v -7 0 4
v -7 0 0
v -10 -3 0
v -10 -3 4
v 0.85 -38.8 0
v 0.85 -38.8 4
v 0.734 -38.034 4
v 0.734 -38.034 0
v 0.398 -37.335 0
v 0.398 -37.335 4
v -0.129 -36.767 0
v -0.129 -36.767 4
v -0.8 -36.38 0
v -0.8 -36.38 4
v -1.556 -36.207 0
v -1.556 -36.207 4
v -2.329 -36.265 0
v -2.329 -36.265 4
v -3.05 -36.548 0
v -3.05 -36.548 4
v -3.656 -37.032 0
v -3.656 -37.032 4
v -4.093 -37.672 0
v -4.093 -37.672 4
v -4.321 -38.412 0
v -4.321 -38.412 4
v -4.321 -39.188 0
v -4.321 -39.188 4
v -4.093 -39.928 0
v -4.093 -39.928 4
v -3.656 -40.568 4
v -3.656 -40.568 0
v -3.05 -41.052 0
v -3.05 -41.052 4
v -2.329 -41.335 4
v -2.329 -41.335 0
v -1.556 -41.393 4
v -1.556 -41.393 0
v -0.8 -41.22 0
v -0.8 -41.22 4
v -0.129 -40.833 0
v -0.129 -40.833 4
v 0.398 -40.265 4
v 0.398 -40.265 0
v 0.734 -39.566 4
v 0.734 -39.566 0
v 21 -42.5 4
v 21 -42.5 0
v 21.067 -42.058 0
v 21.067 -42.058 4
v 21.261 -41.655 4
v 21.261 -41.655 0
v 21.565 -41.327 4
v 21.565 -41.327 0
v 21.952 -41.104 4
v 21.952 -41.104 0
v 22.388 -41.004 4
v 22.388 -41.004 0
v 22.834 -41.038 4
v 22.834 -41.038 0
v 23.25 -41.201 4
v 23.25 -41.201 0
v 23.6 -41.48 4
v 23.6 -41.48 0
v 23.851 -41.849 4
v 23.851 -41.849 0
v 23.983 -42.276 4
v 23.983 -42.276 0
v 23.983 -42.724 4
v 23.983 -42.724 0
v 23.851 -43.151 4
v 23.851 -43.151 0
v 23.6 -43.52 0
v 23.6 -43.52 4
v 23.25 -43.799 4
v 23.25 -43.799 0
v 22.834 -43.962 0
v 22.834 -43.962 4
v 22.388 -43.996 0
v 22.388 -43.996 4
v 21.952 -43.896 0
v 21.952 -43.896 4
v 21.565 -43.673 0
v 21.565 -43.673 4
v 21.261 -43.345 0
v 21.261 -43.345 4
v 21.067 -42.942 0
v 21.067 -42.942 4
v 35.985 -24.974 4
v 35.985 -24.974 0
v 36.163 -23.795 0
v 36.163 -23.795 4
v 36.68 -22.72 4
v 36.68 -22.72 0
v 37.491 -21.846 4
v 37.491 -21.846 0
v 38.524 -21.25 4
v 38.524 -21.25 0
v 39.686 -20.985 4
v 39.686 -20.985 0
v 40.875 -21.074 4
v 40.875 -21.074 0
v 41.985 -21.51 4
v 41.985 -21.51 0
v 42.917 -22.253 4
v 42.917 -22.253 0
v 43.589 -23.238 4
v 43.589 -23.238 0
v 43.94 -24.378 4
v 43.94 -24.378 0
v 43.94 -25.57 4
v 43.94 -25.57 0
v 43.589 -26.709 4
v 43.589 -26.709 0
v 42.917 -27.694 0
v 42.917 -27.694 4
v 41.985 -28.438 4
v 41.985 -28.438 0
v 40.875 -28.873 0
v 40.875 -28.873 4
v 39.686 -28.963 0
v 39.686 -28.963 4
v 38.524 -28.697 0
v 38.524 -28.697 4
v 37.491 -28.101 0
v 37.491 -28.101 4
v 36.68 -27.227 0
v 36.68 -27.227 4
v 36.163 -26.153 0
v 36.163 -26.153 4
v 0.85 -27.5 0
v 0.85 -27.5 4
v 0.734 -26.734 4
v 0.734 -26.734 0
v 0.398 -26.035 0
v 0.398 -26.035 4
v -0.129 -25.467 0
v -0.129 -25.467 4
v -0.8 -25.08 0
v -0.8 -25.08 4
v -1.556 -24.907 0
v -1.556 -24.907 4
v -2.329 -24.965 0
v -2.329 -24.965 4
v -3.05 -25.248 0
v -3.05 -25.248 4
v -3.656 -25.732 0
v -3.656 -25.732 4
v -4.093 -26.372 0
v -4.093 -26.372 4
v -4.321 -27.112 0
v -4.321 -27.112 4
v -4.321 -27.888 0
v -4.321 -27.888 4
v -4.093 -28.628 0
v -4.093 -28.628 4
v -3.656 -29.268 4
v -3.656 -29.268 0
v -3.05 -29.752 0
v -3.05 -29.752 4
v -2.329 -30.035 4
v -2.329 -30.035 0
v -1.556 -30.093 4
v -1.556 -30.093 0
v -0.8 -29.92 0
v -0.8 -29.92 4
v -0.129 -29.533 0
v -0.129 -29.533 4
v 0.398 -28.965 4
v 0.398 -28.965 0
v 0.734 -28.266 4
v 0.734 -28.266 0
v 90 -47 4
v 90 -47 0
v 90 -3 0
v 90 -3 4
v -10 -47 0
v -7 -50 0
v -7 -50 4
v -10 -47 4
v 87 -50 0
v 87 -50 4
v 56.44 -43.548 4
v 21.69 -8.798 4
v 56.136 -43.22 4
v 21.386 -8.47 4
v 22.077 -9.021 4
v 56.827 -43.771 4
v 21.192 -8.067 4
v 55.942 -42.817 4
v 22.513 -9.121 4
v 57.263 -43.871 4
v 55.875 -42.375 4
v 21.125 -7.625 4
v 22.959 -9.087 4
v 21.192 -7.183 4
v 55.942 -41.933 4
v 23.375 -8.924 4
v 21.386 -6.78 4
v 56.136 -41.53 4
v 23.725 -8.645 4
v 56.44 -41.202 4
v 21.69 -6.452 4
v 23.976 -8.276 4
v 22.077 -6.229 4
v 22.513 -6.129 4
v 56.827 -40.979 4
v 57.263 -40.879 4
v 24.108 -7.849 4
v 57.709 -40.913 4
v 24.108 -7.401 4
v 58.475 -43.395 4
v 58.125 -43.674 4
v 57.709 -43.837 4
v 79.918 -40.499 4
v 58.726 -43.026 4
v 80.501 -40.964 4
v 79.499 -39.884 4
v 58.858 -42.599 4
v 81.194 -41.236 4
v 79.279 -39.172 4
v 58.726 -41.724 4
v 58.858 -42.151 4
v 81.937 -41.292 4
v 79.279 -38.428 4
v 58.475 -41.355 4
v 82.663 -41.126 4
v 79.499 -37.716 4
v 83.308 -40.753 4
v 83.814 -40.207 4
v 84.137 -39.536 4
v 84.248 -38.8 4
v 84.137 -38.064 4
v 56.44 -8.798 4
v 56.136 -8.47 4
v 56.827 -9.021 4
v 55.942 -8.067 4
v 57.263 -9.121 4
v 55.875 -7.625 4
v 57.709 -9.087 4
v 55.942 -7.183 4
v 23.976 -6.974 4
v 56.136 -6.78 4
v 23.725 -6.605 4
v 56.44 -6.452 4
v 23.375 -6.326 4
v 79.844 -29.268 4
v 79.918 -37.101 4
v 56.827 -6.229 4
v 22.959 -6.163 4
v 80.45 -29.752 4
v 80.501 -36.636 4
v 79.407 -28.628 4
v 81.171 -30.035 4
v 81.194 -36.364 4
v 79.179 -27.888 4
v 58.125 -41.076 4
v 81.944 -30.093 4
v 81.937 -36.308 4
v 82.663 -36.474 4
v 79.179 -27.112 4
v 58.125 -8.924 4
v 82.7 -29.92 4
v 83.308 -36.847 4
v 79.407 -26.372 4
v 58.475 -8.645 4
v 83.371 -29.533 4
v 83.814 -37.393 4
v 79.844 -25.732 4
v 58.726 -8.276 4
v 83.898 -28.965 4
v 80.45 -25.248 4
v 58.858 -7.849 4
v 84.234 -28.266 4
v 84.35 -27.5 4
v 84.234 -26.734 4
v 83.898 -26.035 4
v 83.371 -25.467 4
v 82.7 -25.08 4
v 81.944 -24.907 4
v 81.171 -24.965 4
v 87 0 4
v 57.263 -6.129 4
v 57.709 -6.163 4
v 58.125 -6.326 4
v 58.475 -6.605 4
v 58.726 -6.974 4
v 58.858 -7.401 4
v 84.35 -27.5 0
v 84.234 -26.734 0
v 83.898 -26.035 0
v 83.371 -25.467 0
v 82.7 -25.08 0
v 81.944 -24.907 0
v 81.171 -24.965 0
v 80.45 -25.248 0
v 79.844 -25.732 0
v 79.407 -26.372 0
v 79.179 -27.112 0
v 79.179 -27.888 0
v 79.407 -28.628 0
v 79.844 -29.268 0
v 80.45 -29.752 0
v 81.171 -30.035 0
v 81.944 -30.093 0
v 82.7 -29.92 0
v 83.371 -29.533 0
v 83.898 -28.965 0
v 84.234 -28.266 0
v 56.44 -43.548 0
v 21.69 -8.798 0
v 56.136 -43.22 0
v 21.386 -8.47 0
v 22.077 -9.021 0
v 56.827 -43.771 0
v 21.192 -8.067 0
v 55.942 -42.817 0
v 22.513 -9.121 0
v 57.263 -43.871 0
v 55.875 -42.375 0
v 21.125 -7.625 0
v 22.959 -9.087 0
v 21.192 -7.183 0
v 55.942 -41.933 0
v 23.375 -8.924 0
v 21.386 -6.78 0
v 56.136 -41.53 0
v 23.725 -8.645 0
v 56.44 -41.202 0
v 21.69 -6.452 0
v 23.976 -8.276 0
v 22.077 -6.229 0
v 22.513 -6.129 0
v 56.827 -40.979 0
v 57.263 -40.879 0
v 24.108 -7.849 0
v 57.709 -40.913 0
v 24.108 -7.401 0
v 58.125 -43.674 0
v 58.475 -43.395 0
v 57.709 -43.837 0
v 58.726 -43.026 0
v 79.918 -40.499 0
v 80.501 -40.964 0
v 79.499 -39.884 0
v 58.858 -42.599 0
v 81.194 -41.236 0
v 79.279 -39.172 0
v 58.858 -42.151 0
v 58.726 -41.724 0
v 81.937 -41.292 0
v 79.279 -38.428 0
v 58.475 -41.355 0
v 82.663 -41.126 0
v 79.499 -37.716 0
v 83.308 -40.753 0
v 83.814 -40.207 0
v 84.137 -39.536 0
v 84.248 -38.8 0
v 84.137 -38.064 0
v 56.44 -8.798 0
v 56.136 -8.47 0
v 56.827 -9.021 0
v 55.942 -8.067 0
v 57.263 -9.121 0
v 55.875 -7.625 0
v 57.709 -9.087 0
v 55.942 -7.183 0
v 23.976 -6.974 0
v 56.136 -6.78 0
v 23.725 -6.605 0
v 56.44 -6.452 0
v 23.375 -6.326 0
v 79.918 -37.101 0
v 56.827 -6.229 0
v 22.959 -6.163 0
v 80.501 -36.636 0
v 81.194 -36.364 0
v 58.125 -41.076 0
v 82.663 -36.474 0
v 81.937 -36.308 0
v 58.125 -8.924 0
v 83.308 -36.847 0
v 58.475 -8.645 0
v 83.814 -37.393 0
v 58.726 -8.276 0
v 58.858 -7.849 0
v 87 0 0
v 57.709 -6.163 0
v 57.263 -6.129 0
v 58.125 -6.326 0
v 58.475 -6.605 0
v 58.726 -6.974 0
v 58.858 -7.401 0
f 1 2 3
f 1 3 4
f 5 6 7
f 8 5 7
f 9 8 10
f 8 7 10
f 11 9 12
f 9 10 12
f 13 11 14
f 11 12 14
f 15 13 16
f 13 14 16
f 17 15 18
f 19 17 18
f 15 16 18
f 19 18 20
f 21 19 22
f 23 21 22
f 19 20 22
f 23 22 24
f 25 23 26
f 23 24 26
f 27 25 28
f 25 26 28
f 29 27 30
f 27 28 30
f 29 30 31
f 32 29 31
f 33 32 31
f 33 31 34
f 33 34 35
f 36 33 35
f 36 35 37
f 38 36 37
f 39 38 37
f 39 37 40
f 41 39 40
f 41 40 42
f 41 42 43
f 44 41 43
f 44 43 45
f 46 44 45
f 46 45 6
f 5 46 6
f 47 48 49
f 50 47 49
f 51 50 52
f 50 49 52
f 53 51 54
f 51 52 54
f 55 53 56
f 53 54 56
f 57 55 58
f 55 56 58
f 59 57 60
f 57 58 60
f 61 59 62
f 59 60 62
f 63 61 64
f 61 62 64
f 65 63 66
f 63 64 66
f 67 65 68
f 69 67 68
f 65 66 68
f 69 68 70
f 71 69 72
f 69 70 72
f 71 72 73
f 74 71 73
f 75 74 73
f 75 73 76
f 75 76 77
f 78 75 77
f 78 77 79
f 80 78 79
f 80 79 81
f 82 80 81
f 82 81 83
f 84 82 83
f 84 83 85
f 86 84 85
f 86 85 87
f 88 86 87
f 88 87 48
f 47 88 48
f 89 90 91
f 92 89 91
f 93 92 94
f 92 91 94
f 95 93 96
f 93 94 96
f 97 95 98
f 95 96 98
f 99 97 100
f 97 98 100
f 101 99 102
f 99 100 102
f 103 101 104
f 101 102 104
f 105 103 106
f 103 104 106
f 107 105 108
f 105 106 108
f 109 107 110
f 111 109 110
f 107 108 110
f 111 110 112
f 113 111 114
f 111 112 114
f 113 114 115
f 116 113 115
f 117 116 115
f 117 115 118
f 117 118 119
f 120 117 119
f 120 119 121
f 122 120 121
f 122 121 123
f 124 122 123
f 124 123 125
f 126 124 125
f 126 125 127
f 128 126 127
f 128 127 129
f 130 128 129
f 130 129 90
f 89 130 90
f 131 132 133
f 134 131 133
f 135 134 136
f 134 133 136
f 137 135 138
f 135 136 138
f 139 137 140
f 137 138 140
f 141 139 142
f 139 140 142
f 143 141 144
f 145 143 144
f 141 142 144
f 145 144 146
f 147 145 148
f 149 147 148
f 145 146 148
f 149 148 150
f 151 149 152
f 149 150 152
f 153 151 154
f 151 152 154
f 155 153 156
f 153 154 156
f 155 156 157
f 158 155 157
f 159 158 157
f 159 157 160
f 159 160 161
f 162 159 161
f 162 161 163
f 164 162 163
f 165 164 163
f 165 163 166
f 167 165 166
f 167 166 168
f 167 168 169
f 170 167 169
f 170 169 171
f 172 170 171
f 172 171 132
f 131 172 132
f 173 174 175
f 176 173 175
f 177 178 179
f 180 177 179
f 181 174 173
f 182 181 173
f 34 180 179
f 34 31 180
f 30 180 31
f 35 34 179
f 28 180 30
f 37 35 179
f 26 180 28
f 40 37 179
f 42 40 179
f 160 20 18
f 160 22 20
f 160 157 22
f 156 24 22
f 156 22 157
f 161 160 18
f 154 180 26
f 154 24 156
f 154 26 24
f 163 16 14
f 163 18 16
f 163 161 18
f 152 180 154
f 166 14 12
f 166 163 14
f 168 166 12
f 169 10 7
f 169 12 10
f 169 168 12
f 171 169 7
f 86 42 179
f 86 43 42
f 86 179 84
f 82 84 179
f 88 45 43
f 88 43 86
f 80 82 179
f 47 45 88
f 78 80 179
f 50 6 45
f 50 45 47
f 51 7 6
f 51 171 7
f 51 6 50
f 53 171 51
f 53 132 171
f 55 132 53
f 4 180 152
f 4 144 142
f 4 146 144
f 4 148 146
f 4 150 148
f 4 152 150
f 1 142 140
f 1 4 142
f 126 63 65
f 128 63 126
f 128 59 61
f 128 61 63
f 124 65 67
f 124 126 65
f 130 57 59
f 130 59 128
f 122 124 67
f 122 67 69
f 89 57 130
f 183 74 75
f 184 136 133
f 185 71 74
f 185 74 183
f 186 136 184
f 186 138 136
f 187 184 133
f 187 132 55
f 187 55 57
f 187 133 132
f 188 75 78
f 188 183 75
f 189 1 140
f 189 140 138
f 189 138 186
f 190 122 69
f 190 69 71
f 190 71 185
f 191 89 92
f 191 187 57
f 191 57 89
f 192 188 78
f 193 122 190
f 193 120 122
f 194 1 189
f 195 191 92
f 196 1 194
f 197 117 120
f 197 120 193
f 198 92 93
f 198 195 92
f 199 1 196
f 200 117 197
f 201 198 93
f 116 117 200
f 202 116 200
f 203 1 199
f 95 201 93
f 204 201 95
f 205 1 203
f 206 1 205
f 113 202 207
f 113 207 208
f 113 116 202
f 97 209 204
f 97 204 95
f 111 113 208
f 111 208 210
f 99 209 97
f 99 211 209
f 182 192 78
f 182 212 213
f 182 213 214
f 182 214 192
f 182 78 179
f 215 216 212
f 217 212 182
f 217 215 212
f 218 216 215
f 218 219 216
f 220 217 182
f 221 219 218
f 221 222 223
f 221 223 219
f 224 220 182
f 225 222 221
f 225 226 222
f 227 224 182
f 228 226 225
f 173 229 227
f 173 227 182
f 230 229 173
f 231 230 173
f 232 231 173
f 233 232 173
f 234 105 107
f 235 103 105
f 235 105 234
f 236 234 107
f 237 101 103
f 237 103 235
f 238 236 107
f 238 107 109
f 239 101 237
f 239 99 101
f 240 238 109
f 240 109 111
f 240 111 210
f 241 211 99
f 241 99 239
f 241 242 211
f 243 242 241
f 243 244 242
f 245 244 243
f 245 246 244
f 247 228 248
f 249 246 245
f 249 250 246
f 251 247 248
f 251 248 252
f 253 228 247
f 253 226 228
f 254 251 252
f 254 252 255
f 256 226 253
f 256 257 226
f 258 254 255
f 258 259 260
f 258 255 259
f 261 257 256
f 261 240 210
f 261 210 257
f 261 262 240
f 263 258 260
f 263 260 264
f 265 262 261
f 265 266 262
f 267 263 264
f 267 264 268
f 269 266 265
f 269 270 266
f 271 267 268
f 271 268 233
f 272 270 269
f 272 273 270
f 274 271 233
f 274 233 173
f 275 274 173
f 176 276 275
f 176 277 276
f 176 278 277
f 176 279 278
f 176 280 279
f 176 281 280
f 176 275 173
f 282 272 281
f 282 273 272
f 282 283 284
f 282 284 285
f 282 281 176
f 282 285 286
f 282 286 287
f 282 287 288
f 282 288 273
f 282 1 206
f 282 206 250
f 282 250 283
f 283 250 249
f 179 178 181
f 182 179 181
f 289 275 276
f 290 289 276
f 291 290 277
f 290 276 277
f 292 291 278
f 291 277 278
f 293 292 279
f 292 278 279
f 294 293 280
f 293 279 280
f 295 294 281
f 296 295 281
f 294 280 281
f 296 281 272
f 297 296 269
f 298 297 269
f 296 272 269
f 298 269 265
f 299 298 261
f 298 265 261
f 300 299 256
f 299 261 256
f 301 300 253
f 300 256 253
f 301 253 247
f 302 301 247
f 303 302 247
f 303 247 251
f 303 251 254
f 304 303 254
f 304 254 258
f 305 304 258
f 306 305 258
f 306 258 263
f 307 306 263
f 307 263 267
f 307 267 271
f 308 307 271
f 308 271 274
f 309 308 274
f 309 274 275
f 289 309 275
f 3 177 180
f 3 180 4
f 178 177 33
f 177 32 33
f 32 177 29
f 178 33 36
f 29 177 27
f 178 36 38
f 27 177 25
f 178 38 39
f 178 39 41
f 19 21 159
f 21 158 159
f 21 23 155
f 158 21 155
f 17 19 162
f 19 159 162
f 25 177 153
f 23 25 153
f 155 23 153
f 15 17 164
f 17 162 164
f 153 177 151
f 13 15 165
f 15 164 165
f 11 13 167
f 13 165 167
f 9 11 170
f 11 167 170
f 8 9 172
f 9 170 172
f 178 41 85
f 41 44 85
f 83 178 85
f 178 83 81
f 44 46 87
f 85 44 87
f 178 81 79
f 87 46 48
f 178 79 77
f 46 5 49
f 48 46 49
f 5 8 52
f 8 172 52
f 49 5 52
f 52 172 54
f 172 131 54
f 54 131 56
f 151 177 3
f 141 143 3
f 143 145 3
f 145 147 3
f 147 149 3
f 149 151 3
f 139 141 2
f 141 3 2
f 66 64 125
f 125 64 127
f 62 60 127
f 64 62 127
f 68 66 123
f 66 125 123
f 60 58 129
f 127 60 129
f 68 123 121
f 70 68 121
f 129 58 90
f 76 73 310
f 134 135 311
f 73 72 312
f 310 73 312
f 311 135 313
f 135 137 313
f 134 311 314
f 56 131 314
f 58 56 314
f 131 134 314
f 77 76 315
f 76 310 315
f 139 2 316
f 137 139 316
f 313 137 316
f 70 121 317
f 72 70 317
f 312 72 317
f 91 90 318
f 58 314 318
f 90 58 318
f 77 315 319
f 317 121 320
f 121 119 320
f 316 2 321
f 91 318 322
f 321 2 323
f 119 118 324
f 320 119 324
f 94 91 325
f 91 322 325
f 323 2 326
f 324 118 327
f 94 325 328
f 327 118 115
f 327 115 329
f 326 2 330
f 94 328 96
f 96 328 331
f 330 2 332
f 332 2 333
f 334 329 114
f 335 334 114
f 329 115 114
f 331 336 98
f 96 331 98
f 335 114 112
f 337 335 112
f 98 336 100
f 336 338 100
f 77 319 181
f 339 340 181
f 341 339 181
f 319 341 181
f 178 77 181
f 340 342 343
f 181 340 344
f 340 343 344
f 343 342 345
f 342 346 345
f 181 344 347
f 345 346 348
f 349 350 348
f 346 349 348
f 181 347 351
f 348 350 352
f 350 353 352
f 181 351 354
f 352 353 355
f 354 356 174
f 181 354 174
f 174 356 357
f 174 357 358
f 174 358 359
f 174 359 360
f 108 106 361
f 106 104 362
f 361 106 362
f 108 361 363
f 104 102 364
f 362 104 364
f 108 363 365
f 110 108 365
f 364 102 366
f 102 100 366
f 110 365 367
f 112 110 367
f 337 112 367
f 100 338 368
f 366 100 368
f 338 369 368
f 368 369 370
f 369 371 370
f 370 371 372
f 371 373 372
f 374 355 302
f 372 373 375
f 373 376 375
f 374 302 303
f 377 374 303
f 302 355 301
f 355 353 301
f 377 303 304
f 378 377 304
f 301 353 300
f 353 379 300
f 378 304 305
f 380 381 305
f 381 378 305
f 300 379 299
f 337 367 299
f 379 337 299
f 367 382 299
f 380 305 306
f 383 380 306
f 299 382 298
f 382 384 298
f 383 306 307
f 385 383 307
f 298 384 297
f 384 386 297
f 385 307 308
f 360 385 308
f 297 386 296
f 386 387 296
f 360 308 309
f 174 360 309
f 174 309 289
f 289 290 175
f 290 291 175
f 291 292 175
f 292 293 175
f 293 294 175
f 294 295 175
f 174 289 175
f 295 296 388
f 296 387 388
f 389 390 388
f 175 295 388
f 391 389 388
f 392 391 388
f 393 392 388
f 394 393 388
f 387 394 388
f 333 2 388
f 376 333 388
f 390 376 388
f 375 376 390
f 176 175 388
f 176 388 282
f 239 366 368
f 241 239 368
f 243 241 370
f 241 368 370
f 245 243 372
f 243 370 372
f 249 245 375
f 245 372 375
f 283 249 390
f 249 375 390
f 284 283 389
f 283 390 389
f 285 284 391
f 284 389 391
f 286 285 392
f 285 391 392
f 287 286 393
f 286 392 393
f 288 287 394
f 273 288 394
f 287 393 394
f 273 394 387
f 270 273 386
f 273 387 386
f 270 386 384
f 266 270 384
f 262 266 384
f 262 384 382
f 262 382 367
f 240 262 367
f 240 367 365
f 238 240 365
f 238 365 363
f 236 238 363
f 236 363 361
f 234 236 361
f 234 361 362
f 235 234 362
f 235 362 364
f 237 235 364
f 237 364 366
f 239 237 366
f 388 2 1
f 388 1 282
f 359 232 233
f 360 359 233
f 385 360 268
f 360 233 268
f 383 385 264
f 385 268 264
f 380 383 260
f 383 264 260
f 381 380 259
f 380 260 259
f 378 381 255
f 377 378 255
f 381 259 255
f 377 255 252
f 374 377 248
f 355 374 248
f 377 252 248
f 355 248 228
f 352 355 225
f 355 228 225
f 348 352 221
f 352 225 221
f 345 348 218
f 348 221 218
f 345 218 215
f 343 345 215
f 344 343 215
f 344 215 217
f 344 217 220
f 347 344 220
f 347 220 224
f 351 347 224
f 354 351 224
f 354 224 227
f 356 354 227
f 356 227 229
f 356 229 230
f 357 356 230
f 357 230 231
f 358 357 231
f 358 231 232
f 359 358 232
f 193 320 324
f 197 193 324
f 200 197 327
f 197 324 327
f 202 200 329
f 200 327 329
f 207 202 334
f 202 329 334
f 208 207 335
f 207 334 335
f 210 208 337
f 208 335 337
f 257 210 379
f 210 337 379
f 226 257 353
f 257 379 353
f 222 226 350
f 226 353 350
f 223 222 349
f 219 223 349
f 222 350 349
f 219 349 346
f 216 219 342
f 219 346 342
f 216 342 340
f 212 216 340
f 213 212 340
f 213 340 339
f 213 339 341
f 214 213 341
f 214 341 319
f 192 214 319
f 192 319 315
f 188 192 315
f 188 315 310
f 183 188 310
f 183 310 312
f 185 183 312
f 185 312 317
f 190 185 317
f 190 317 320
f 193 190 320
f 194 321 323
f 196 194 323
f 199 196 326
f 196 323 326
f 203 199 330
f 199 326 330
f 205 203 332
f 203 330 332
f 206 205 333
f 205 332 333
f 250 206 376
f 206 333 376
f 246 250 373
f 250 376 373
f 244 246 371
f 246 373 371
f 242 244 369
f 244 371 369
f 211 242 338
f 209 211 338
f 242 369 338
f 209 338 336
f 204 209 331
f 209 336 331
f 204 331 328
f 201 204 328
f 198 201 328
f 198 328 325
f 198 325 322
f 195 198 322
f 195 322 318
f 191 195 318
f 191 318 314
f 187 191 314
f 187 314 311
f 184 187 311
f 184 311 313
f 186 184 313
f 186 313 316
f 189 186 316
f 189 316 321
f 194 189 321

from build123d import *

# Parameters (mm, degrees)
ESQUISSE1_W             = 100
ESQUISSE1_H             = 50
BOSS_EXTRU_1_DEPTH      = 4
ESQUISSE2_R             = 1.5
ENL_V_MAT_EXTRU_1_DEPTH = 104.033974979
ESQUISSE3_R             = 4
ENL_V_MAT_EXTRU_2_DEPTH = 104.033974979
CONG_1_SIZE             = 3
ESQUISSE4_R             = 2.6
ESQUISSE4_R_2           = 2.49849628
ENL_V_MAT_EXTRU_3_DEPTH = 104.033974979


with BuildPart() as part:
    # Esquisse1 → Boss.-Extru.1 (new body)
    with BuildSketch(Plane.XY):
        with Locations((40, -25)):
            Rectangle(ESQUISSE1_W, ESQUISSE1_H)
    extrude(amount=BOSS_EXTRU_1_DEPTH)

    # Esquisse2 → Enlèv. mat.-Extru.1 (cut, through all)
    with BuildSketch(Plane(origin=(0, 0, 0), x_dir=(-1, 0, 0), z_dir=(0, 0, -1))):
        with Locations((-22.625, -7.625)):
            Circle(ESQUISSE2_R)
        with Locations((-57.375, -42.375)):
            Circle(ESQUISSE2_R)
        with Locations((-57.375, -7.625)):
            Circle(ESQUISSE2_R)
        with Locations((-22.5, -42.5)):
            Circle(ESQUISSE2_R)
    extrude(amount=-ENL_V_MAT_EXTRU_1_DEPTH, mode=Mode.SUBTRACT)

    # Esquisse3 → Enlèv. mat.-Extru.2 (cut, through all)
    with BuildSketch(Plane(origin=(0, 0, 0), x_dir=(-1, 0, 0), z_dir=(0, 0, -1))):
        with Locations((-39.984893454, -24.973718249)):
            Circle(ESQUISSE3_R)
    extrude(amount=-ENL_V_MAT_EXTRU_2_DEPTH, mode=Mode.SUBTRACT)

    # Congé1
    cong_1_edges = [part.edges().sort_by_distance(p)[0] for p in [
        (-10, 0, 2),
        (90, 0, 2),
        (90, -50, 2),
        (-10, -50, 2),
    ]]
    chamfer(cong_1_edges, length=CONG_1_SIZE)

    # Esquisse4 → Enlèv. mat.-Extru.3 (cut, through all)
    with BuildSketch(Plane.XY.offset(4)):
        with Locations((81.75, -27.5)):
            Circle(ESQUISSE4_R)
        with Locations((81.75, -38.8)):
            Circle(ESQUISSE4_R_2)
        with Locations((-1.75, -27.5)):
            Circle(ESQUISSE4_R)
        with Locations((-1.75, -38.8)):
            Circle(ESQUISSE4_R)
    extrude(amount=-ENL_V_MAT_EXTRU_3_DEPTH, mode=Mode.SUBTRACT)


solid = part.part
